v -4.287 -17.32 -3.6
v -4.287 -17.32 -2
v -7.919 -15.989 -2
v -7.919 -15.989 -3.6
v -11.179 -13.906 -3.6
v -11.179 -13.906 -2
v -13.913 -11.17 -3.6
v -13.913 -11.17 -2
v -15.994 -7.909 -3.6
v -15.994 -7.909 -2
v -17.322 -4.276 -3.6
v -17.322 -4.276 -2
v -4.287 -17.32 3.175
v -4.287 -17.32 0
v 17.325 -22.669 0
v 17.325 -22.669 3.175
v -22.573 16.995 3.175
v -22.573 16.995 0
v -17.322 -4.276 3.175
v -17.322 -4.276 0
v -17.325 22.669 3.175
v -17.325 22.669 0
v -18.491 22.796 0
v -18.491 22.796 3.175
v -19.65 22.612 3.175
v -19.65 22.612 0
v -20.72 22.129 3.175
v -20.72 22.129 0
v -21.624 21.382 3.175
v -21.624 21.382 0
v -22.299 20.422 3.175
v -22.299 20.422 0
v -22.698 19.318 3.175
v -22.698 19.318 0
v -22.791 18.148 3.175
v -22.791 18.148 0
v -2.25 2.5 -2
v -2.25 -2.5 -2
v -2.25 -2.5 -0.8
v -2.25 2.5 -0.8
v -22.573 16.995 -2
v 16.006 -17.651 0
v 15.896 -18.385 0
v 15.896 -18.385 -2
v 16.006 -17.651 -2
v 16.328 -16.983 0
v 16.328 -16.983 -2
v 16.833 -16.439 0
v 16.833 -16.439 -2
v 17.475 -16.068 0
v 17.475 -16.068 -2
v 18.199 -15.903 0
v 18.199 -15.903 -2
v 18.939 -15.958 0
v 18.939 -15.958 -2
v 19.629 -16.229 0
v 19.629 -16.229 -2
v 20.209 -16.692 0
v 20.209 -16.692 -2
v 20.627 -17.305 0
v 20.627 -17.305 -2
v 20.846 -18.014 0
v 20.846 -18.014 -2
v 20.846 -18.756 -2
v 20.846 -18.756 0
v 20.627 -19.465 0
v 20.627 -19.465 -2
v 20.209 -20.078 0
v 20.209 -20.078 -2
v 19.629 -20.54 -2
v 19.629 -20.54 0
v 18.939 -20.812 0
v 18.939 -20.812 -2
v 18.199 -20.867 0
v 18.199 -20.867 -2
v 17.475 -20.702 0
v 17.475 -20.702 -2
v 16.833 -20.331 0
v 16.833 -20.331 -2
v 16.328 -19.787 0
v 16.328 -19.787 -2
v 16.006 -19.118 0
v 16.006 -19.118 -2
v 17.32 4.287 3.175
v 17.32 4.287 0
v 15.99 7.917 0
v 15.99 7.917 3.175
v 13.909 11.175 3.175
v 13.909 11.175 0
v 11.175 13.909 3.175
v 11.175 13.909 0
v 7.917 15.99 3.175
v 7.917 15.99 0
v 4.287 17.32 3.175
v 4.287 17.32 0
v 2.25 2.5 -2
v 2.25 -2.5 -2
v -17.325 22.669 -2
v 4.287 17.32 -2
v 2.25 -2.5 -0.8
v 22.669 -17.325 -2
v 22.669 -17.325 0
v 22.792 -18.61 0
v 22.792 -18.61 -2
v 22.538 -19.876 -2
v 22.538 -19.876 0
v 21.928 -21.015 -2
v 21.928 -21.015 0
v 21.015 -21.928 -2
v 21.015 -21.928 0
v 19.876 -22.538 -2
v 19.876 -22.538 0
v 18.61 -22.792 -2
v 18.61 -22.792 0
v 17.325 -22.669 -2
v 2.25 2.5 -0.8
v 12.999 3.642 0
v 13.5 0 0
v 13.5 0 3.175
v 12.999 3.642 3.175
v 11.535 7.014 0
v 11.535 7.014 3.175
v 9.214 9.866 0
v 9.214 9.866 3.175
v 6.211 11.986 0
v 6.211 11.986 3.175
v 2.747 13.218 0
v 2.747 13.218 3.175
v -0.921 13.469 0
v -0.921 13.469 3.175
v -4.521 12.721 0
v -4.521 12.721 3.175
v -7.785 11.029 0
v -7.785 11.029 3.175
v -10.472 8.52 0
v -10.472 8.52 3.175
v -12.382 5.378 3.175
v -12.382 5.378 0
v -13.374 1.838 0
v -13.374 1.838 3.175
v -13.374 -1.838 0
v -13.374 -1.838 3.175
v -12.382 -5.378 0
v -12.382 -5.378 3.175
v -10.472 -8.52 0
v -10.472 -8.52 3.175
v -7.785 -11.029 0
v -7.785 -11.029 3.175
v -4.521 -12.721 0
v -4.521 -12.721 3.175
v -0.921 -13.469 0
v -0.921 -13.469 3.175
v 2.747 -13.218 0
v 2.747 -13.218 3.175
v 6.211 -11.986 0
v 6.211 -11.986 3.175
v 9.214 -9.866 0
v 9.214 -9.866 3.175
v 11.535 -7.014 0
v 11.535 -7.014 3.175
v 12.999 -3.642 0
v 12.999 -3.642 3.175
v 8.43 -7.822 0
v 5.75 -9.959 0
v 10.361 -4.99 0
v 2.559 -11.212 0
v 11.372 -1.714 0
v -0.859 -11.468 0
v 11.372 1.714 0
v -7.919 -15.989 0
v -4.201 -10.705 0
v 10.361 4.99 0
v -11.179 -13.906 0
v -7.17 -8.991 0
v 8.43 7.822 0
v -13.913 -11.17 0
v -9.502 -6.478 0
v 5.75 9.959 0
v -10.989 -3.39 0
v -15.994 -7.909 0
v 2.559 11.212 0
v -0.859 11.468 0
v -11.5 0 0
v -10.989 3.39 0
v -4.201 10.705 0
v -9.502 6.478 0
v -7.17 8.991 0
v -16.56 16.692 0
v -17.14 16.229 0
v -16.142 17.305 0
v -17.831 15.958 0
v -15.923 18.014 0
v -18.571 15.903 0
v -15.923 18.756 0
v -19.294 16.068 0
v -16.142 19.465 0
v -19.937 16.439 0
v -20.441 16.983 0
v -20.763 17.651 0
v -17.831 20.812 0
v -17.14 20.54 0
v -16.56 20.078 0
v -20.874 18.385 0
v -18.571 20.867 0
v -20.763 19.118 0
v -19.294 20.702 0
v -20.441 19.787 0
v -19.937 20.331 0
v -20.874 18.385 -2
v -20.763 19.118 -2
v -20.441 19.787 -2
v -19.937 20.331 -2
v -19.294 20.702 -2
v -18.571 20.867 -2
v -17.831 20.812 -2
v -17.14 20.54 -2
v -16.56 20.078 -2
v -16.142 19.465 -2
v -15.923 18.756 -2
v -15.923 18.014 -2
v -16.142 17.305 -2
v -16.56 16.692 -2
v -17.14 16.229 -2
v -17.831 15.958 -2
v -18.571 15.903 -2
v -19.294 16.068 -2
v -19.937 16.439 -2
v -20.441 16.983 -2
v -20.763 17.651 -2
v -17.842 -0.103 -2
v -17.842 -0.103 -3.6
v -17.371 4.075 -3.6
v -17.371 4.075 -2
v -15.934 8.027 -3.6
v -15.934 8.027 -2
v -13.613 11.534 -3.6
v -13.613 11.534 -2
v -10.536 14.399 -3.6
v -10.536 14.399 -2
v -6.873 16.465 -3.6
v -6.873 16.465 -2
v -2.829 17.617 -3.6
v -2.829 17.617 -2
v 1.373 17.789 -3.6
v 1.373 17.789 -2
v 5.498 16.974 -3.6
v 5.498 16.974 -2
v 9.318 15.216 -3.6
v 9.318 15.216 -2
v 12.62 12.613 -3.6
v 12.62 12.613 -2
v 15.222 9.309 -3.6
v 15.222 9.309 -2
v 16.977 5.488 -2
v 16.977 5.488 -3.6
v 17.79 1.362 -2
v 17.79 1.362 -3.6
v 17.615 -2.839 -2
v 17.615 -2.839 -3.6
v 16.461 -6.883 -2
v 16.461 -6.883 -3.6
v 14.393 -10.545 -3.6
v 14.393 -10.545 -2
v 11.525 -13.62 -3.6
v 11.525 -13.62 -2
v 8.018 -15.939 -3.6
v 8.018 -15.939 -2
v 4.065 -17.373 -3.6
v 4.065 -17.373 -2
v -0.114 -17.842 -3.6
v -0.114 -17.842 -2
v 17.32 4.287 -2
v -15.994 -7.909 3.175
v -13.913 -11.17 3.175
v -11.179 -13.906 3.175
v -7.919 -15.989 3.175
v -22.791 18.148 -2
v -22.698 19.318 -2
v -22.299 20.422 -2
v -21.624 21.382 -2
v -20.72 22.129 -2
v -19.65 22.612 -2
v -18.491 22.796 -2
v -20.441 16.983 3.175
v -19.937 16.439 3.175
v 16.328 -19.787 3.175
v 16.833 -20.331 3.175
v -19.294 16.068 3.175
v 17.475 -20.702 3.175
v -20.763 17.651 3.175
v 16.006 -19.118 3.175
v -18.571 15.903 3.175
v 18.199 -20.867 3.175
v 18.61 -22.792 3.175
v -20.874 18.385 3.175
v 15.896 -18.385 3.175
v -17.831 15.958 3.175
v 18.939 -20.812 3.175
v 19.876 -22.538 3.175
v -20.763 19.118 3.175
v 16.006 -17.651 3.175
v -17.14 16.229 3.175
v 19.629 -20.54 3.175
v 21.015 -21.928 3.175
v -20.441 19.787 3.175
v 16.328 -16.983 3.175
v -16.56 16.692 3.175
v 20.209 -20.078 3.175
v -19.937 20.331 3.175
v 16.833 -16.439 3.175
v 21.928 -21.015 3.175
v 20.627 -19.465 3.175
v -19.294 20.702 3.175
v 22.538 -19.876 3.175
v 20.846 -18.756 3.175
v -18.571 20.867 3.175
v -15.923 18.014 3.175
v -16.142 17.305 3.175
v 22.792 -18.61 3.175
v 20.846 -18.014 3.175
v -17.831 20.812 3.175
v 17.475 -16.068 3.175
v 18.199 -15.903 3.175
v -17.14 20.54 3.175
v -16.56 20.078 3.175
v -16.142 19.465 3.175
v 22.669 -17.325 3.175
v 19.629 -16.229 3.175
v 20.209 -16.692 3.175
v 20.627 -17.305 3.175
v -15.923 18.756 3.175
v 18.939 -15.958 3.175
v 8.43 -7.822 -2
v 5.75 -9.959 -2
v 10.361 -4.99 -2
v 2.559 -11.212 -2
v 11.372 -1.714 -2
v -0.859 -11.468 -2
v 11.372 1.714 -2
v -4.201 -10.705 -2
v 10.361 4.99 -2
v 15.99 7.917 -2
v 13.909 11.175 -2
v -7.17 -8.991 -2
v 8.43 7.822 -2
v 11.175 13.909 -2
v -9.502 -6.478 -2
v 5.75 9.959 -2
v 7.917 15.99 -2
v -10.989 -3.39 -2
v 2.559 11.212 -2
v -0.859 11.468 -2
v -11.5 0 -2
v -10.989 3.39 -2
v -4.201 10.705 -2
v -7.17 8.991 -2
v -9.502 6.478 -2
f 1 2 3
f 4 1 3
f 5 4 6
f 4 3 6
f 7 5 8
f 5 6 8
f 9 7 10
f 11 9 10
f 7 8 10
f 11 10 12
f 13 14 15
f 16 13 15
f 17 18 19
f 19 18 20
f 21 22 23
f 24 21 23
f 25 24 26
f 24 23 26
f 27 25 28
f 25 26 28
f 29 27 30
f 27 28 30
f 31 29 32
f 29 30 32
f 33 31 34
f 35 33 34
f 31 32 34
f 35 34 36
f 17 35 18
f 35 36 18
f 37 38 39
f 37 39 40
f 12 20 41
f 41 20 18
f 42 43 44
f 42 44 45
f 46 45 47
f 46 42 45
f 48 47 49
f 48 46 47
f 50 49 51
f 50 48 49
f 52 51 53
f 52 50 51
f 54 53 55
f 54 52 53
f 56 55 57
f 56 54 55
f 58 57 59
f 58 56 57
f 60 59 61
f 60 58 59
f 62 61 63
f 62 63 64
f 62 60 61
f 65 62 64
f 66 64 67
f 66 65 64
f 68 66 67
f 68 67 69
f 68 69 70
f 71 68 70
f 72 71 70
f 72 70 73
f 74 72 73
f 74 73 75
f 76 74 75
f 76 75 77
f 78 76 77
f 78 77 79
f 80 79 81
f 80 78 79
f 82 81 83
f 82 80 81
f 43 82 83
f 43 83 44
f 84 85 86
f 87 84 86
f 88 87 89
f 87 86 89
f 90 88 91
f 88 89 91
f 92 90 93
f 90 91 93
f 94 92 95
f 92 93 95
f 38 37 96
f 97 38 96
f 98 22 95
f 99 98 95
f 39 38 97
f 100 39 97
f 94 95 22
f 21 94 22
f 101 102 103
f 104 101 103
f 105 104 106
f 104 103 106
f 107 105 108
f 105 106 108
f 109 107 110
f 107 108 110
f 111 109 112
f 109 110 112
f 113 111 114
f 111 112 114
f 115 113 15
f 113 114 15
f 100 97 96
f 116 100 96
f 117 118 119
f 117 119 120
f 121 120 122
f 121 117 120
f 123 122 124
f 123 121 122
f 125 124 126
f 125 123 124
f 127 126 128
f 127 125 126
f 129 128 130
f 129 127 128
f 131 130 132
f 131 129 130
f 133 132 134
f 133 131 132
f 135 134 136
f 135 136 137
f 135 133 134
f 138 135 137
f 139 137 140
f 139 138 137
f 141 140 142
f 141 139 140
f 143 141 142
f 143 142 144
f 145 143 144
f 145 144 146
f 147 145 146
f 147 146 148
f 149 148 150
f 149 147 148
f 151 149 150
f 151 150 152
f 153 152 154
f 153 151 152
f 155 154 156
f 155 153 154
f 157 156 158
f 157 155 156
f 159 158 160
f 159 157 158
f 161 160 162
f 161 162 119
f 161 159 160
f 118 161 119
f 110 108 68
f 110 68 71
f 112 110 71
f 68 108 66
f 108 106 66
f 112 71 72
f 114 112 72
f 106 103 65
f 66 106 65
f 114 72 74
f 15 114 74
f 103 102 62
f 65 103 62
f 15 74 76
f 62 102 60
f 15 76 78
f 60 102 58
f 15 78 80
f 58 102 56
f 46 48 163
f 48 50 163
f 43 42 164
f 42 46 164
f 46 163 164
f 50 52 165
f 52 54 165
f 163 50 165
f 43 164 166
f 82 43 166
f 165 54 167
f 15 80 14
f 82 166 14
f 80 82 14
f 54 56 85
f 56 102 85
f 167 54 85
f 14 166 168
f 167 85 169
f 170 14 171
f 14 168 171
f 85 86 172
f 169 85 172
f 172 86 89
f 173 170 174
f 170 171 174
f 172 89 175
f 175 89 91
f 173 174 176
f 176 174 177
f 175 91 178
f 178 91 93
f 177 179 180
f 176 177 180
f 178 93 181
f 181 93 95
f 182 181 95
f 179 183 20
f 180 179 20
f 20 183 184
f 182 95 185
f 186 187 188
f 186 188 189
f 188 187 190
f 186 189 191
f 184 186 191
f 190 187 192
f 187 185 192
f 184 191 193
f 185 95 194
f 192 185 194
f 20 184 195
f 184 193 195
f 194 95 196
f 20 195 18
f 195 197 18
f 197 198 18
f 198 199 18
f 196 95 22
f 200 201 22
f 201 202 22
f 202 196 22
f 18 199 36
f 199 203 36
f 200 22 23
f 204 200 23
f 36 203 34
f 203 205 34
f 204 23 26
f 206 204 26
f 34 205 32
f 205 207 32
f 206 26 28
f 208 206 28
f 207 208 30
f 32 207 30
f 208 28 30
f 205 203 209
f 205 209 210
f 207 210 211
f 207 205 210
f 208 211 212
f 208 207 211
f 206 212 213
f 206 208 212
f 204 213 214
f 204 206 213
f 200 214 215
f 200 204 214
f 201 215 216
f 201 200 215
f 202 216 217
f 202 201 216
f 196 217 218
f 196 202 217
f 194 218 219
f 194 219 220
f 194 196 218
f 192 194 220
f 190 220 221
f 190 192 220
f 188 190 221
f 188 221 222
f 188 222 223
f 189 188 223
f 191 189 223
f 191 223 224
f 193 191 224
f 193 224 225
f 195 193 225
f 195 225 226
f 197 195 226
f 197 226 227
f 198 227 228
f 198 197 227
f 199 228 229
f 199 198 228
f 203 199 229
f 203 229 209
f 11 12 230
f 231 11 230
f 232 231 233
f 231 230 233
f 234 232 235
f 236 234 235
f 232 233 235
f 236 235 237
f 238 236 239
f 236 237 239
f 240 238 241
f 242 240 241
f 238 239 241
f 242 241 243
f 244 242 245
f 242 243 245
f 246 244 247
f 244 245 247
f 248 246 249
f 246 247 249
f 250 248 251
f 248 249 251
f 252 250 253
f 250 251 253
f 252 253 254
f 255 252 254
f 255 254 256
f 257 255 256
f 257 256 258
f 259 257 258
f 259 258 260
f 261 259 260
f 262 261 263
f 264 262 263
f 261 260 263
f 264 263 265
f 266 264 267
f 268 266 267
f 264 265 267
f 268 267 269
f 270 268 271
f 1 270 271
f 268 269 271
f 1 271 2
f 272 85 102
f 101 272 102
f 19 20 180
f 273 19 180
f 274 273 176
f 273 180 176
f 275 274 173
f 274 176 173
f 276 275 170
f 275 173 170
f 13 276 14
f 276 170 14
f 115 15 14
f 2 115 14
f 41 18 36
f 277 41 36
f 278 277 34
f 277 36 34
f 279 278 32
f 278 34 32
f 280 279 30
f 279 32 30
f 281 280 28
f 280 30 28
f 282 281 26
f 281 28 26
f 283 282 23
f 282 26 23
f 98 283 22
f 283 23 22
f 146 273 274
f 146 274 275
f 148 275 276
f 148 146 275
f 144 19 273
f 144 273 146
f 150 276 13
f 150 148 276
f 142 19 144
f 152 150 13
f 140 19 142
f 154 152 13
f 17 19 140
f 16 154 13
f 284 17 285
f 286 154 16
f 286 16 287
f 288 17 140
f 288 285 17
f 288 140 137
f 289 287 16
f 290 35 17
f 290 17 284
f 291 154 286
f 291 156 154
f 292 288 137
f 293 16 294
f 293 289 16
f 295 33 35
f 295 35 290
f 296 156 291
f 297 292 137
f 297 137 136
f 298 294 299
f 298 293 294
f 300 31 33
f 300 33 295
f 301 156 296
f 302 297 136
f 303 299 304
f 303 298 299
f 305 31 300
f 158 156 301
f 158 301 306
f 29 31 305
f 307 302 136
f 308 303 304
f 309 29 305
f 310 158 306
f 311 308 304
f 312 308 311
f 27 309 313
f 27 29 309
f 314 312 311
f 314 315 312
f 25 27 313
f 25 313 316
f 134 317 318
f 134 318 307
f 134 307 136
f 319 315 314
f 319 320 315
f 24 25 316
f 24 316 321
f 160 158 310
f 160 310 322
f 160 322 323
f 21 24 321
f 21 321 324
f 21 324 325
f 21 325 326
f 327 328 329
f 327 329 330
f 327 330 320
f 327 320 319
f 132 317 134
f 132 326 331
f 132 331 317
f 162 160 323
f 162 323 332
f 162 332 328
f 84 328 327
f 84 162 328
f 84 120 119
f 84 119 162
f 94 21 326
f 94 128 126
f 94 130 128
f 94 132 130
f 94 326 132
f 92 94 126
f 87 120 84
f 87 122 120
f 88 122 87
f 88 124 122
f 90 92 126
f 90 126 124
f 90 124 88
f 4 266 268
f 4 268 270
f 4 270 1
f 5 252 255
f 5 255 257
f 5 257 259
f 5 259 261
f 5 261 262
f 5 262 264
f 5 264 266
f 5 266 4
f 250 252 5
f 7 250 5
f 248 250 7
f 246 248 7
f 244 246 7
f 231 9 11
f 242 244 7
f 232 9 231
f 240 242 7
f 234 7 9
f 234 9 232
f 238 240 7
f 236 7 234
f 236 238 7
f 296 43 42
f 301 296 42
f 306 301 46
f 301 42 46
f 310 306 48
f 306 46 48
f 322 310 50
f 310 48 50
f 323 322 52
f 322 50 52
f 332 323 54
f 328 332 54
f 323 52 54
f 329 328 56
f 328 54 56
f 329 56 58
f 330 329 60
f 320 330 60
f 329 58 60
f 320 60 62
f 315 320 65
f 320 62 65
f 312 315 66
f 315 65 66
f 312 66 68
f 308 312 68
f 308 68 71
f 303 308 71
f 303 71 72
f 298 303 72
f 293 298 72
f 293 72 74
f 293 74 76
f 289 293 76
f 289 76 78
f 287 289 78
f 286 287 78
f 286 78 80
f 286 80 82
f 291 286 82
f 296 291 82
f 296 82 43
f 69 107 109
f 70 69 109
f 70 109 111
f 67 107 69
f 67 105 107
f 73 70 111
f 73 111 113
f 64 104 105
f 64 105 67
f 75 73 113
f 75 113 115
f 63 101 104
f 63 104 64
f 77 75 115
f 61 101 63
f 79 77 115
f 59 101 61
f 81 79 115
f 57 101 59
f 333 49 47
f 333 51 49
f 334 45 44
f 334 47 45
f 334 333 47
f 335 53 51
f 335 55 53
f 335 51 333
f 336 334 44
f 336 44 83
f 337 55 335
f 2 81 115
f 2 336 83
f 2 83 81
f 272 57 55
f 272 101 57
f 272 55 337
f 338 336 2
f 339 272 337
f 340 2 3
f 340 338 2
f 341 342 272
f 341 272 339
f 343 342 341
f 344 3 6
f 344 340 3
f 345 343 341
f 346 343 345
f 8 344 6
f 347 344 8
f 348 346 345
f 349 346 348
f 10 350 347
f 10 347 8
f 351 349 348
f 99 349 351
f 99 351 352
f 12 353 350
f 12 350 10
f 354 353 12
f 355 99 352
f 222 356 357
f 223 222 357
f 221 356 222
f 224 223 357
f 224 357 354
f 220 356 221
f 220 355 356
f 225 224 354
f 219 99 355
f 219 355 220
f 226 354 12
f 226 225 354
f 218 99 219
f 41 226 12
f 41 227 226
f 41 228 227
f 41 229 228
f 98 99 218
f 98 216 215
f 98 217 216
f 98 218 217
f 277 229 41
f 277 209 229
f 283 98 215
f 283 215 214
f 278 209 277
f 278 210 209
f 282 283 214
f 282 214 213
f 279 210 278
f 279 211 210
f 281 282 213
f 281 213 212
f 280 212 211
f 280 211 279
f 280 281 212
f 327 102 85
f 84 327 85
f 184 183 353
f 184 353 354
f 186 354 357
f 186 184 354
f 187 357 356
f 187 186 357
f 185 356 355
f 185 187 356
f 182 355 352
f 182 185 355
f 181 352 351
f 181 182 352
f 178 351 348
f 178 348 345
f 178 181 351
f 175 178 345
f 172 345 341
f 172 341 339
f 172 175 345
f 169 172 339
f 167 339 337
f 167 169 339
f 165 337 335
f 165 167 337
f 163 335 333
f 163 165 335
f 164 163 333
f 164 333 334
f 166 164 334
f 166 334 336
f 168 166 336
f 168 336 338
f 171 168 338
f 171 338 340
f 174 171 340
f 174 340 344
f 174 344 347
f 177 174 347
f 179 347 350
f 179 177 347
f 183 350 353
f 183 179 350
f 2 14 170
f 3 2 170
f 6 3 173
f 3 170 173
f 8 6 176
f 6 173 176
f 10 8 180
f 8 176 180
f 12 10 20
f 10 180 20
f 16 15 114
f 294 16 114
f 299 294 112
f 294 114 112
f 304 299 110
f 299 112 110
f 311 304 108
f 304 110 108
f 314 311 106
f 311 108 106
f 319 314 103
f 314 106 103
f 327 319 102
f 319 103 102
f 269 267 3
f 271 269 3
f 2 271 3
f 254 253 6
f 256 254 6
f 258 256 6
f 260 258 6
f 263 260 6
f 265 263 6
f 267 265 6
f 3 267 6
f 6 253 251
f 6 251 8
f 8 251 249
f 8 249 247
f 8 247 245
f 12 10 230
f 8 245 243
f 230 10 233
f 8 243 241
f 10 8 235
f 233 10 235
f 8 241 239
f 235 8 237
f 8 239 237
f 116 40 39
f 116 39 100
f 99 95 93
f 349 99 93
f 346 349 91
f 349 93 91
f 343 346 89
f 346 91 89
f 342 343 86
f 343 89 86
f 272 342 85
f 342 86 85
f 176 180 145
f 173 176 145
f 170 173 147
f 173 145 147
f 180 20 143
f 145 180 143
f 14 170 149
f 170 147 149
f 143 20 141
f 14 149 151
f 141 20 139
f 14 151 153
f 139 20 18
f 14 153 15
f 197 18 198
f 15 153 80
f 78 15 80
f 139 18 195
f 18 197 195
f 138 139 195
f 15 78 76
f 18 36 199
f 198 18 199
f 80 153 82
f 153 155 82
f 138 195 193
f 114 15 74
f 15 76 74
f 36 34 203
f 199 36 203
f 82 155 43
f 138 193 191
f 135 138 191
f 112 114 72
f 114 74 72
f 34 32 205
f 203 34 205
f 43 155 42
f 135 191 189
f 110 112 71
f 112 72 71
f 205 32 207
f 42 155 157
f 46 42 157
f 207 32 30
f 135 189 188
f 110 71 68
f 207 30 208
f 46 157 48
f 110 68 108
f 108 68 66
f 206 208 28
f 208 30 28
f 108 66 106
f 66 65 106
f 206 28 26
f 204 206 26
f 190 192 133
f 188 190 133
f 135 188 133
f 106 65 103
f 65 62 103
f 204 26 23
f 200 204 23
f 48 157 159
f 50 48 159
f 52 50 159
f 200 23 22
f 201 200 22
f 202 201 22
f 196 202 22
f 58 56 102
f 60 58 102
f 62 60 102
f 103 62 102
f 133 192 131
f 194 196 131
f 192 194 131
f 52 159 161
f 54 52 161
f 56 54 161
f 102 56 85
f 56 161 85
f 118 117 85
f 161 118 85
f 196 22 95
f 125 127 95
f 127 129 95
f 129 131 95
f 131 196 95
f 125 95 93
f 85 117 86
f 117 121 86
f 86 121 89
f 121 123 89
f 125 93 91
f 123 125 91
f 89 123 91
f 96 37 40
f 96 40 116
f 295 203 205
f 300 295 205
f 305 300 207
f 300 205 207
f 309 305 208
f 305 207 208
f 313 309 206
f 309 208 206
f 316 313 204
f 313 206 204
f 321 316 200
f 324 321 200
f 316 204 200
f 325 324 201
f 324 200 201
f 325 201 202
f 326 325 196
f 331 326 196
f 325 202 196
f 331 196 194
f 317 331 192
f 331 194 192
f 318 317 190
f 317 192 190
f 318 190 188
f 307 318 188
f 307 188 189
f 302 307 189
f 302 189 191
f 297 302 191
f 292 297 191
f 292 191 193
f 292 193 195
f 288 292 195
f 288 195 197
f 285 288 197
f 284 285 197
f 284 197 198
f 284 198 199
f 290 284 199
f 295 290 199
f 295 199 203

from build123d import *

# Parameters (mm, degrees)
SKETCH1_R              = 13.5
BOSS_EXTRUDE1_DEPTH    = 3.175
F_10_CLEARANCE_HOLE1_D = 4.9784
SKETCH6_R              = 11.5
SKETCH6_R_2            = 2.4892
BOSS_EXTRUDE4_DEPTH    = 2
BOSS_EXTRUDE2_DEPTH    = 1.6
SKETCH5_W              = 4.5
SKETCH5_H              = 5
BOSS_EXTRUDE3_DEPTH    = 1.2


with BuildPart() as part:
    # Sketch1 → Boss-Extrude1 (new body)
    with BuildSketch(Plane.XY):
        with BuildLine():
            Line((-22.5732405, 16.995050894), (-17.322240947, -4.276159151))
            ThreePointArc((-17.322240947, -4.276159151), (-12.620205553, -12.612532668), (-4.286693209, -17.319637116))
            Line((-4.286693209, -17.319637116), (17.324529619, -22.668518361))
            ThreePointArc((17.324529619, -22.668518361), (21.505238536, -21.505238536), (22.668518361, -17.324529619))
            Line((22.668518361, -17.324529619), (17.319637116, 4.286693209))
            ThreePointArc((17.319637116, 4.286693209), (12.616369694, 12.616369694), (4.286693209, 17.319637116))
            Line((4.286693209, 17.319637116), (-17.324529619, 22.668518361))
            ThreePointArc((-17.324529619, 22.668518361), (-21.624142677, 21.381620409), (-22.5732405, 16.995050894))
        make_face()
        Circle(SKETCH1_R, mode=Mode.SUBTRACT)
    extrude(amount=BOSS_EXTRUDE1_DEPTH)

    # #10 Clearance Hole1 (through all)
    with Locations(Plane.XY.offset(3.175)):
        with Locations((-18.384776311, 18.384776311), (18.384776311, -18.384776311)):
            Hole(F_10_CLEARANCE_HOLE1_D / 2)


with BuildPart() as body_2:
    # Sketch6 → Boss-Extrude4 (new body)
    with BuildSketch(Plane(origin=(0, 0, 0), x_dir=(-1, 0, 0), z_dir=(0, 0, -1))):
        with BuildLine():
            Line((17.324529619, 22.668518361), (-4.286693209, 17.319637116))
            ThreePointArc((-4.286693209, 17.319637116), (-12.616369694, 12.616369694), (-17.319637116, 4.286693209))
            Line((-17.319637116, 4.286693209), (-22.668518361, -17.324529619))
            ThreePointArc((-22.668518361, -17.324529619), (-21.505238536, -21.505238536), (-17.324529619, -22.668518361))
            Line((-17.324529619, -22.668518361), (4.286693209, -17.319637116))
            ThreePointArc((4.286693209, -17.319637116), (12.620205553, -12.612532668), (17.322240947, -4.276159151))
            Line((17.322240947, -4.276159151), (22.5732405, 16.995050894))
            ThreePointArc((22.5732405, 16.995050894), (21.624142677, 21.381620409), (17.324529619, 22.668518361))
        make_face()
        Circle(SKETCH6_R, mode=Mode.SUBTRACT)
        with Locations((-18.384776311, -18.384776311)):
            Circle(SKETCH6_R_2, mode=Mode.SUBTRACT)
        with Locations((18.384776311, 18.384776311)):
            Circle(SKETCH6_R_2, mode=Mode.SUBTRACT)
    extrude(amount=BOSS_EXTRUDE4_DEPTH)


with BuildPart() as body_3:
    # Sketch4 → Boss-Extrude2 (new body)
    with BuildSketch(Plane(origin=(0, 0, -2), x_dir=(-1, 0, 0), z_dir=(0, 0, -1))):
        with BuildLine():
            ThreePointArc((17.322240947, -4.276159151), (-12.620205553, 12.612532668), (4.286693209, -17.319637116))
            ThreePointArc((4.286693209, -17.319637116), (12.620205553, -12.612532668), (17.322240947, -4.276159151))
        make_face()
    extrude(amount=BOSS_EXTRUDE2_DEPTH)


with BuildPart() as body_4:
    # Sketch5 → Boss-Extrude3 (new body)
    with BuildSketch(Plane.XY.offset(-2)):
        Rectangle(SKETCH5_W, SKETCH5_H)
    extrude(amount=BOSS_EXTRUDE3_DEPTH)


solid = Compound([part.part, body_2.part, body_3.part, body_4.part])
